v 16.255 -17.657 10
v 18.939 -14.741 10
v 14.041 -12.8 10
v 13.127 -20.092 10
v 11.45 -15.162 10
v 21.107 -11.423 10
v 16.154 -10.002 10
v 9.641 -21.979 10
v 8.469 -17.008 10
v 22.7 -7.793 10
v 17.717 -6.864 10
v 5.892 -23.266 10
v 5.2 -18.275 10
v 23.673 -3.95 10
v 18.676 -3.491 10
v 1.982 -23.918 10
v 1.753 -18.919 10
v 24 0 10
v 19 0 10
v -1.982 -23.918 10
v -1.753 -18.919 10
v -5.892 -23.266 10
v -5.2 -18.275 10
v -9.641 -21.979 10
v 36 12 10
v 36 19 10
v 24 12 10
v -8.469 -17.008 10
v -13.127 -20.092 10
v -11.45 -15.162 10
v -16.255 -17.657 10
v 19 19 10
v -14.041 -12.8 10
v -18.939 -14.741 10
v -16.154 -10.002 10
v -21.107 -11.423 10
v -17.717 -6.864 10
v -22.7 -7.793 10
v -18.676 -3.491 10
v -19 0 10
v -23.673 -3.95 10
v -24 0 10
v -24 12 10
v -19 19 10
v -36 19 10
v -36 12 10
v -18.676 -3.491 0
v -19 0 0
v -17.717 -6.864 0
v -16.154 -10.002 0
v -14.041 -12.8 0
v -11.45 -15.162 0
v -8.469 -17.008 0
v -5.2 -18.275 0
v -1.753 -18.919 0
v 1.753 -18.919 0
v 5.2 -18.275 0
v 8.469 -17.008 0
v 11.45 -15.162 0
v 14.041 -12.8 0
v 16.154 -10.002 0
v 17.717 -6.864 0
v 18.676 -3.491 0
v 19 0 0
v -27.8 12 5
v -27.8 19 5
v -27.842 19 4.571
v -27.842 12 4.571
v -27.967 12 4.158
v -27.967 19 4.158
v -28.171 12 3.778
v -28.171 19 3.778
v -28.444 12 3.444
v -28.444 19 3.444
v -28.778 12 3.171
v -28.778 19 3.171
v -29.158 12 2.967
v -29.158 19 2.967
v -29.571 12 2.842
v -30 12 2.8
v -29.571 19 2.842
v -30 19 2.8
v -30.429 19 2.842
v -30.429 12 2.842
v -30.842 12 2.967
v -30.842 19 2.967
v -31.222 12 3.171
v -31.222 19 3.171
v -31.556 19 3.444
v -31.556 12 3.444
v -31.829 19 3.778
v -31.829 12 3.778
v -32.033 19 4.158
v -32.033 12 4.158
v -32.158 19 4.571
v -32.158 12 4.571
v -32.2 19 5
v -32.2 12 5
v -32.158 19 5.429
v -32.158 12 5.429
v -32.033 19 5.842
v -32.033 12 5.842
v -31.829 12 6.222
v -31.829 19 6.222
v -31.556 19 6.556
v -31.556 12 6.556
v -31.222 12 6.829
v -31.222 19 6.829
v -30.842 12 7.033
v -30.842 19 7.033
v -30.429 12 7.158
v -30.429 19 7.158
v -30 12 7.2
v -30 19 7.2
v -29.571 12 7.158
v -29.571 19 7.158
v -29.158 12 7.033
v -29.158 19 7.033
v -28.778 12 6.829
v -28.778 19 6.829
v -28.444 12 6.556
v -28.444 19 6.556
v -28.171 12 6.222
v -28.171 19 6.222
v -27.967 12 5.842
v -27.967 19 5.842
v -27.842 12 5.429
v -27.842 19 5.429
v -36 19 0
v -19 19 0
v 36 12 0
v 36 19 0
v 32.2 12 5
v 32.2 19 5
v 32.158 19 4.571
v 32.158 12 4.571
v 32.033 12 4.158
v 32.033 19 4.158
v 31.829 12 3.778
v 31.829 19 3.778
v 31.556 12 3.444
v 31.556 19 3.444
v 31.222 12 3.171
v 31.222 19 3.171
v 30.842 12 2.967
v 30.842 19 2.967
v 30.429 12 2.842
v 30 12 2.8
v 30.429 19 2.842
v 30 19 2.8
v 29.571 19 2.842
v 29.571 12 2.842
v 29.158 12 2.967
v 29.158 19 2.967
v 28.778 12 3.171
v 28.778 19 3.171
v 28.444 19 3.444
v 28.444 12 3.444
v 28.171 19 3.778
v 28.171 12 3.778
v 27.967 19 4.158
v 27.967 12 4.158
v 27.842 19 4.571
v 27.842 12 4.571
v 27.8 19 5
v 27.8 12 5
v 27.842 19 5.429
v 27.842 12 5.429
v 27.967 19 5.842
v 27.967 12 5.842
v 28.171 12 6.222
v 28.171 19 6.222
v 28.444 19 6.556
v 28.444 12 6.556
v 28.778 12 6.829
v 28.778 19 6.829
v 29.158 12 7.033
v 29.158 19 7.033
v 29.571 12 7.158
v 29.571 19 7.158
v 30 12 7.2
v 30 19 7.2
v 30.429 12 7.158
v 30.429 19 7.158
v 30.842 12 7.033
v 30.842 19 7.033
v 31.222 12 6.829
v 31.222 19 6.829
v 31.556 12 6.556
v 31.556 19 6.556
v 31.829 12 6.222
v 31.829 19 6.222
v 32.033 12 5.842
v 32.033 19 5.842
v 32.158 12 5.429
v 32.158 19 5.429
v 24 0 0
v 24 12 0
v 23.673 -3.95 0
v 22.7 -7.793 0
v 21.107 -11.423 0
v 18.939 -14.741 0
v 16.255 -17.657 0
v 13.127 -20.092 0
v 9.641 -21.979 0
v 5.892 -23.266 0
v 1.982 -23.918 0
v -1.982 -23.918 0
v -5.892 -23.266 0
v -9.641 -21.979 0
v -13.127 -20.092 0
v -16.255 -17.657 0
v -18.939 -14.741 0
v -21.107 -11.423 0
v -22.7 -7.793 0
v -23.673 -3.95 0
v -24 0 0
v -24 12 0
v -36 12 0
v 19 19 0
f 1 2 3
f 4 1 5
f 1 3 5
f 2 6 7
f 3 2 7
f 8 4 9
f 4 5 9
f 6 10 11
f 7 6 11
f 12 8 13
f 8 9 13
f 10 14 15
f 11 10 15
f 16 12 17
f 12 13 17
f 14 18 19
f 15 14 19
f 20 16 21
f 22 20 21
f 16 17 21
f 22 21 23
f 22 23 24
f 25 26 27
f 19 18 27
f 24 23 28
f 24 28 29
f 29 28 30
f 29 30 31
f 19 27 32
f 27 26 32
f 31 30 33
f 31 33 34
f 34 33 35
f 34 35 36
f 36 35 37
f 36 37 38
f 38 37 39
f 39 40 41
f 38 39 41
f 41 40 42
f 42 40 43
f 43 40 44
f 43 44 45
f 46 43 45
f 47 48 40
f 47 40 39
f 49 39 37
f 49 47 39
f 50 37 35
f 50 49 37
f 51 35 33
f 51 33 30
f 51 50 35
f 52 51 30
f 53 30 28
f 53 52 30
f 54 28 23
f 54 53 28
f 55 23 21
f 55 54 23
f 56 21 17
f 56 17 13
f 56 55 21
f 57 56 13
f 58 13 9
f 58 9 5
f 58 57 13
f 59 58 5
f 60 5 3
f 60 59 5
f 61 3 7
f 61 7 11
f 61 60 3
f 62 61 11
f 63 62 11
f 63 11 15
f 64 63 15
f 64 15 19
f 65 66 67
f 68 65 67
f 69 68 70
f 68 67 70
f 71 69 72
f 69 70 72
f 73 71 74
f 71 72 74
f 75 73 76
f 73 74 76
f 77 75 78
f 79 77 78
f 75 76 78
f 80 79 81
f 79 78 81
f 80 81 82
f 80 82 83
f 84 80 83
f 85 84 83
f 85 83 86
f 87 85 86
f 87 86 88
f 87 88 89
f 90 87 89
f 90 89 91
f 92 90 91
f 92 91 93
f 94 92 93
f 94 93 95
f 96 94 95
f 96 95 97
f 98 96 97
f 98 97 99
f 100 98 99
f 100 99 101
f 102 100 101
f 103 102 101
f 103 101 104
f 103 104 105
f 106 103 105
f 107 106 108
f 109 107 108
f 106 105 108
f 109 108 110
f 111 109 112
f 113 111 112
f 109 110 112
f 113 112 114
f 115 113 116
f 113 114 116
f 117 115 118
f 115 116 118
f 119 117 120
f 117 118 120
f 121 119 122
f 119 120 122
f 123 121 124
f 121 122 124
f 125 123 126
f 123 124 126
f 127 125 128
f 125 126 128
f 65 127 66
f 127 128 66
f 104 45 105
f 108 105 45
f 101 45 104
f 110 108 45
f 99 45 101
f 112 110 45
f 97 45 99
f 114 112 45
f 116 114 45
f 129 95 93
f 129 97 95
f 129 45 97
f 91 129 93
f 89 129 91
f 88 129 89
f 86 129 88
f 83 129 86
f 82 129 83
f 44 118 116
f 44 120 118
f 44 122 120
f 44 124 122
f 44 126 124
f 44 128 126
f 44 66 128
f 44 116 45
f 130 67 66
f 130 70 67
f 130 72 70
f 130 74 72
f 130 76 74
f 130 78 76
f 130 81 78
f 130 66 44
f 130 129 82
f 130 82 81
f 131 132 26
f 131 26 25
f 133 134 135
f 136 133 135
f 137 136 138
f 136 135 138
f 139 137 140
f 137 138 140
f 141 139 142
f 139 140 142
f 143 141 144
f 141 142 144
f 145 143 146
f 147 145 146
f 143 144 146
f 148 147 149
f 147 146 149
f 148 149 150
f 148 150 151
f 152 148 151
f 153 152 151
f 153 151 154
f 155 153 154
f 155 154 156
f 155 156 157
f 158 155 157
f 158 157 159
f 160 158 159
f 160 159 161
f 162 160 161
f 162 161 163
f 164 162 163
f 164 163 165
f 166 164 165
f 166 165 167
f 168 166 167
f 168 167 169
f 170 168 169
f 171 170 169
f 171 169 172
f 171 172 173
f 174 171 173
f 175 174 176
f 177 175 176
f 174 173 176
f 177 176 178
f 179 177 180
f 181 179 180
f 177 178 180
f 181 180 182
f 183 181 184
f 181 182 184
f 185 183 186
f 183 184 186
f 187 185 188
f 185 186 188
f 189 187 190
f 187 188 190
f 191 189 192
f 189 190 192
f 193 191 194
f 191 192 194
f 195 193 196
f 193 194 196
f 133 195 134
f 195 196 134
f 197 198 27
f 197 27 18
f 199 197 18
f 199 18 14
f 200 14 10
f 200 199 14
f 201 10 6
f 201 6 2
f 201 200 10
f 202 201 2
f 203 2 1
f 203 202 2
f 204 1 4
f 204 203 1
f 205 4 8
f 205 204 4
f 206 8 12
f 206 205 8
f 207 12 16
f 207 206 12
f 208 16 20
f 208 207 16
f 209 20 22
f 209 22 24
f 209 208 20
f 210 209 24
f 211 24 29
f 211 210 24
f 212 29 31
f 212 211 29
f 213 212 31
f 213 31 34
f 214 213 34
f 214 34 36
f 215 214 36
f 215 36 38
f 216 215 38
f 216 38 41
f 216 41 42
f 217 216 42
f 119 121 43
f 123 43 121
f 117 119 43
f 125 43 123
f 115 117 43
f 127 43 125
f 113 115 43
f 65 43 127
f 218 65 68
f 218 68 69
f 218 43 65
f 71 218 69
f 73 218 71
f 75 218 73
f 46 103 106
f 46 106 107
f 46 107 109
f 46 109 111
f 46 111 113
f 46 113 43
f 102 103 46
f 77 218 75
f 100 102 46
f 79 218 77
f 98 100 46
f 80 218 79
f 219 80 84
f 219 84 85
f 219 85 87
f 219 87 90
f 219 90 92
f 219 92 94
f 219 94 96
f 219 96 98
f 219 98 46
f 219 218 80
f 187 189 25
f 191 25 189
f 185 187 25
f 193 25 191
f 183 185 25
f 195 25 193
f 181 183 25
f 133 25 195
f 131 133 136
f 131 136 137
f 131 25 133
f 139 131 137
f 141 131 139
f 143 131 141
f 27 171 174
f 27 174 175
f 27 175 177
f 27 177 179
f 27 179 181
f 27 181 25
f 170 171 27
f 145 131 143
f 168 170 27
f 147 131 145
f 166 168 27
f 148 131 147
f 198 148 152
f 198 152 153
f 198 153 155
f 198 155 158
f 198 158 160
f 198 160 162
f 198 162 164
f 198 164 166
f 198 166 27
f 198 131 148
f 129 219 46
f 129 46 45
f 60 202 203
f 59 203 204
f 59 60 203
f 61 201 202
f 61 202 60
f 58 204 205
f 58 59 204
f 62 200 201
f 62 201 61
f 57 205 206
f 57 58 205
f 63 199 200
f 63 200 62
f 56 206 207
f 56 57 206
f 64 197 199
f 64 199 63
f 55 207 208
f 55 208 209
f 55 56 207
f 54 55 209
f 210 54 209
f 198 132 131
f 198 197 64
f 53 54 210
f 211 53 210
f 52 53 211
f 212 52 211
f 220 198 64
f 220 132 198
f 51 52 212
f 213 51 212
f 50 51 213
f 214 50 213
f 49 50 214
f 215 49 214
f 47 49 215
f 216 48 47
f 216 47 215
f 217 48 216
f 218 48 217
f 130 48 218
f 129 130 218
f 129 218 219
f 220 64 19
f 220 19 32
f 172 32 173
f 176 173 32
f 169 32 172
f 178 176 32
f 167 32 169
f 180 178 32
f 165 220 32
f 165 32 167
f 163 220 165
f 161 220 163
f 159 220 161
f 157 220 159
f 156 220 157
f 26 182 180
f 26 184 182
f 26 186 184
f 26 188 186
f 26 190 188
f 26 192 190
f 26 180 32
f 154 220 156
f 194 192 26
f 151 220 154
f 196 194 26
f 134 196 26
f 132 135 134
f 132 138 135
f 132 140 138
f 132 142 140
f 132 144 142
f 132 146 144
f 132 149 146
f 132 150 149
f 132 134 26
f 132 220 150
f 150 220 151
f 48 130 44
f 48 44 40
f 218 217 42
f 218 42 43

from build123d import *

# Parameters (mm, degrees)
RESSALTO_EXTRUS_O1_DEPTH = 10
ESBO_O2_R                = 2.2
CORTE_EXTRUS_O1_DEPTH    = 10


with BuildPart() as part:
    # Esboço1 → Ressalto-extrusão1 (new body)
    with BuildSketch(Plane.XY):
        with BuildLine():
            Line((-36, 19), (-19, 19))
            Line((-19, 19), (-19, 0))
            ThreePointArc((-19, 0), (0, -19), (19, 0))
            Line((19, 0), (19, 19))
            Line((19, 19), (36, 19))
            Line((36, 19), (36, 12))
            Line((36, 12), (24, 12))
            Line((24, 12), (24, 0))
            ThreePointArc((24, 0), (0, -24), (-24, 0))
            Line((-24, 0), (-24, 12))
            Line((-24, 12), (-36, 12))
            Line((-36, 12), (-36, 19))
        make_face()
    extrude(amount=RESSALTO_EXTRUS_O1_DEPTH)

    # Esboço2 → Corte-extrusão1 (cut)
    with BuildSketch(Plane(origin=(0, 19, 0), x_dir=(1, 0, 0), z_dir=(0, 1, 0))):
        with Locations((-30, -5)):
            Circle(ESBO_O2_R)
        with Locations((30, -5)):
            Circle(ESBO_O2_R)
    extrude(amount=-CORTE_EXTRUS_O1_DEPTH, mode=Mode.SUBTRACT)


solid = part.part
